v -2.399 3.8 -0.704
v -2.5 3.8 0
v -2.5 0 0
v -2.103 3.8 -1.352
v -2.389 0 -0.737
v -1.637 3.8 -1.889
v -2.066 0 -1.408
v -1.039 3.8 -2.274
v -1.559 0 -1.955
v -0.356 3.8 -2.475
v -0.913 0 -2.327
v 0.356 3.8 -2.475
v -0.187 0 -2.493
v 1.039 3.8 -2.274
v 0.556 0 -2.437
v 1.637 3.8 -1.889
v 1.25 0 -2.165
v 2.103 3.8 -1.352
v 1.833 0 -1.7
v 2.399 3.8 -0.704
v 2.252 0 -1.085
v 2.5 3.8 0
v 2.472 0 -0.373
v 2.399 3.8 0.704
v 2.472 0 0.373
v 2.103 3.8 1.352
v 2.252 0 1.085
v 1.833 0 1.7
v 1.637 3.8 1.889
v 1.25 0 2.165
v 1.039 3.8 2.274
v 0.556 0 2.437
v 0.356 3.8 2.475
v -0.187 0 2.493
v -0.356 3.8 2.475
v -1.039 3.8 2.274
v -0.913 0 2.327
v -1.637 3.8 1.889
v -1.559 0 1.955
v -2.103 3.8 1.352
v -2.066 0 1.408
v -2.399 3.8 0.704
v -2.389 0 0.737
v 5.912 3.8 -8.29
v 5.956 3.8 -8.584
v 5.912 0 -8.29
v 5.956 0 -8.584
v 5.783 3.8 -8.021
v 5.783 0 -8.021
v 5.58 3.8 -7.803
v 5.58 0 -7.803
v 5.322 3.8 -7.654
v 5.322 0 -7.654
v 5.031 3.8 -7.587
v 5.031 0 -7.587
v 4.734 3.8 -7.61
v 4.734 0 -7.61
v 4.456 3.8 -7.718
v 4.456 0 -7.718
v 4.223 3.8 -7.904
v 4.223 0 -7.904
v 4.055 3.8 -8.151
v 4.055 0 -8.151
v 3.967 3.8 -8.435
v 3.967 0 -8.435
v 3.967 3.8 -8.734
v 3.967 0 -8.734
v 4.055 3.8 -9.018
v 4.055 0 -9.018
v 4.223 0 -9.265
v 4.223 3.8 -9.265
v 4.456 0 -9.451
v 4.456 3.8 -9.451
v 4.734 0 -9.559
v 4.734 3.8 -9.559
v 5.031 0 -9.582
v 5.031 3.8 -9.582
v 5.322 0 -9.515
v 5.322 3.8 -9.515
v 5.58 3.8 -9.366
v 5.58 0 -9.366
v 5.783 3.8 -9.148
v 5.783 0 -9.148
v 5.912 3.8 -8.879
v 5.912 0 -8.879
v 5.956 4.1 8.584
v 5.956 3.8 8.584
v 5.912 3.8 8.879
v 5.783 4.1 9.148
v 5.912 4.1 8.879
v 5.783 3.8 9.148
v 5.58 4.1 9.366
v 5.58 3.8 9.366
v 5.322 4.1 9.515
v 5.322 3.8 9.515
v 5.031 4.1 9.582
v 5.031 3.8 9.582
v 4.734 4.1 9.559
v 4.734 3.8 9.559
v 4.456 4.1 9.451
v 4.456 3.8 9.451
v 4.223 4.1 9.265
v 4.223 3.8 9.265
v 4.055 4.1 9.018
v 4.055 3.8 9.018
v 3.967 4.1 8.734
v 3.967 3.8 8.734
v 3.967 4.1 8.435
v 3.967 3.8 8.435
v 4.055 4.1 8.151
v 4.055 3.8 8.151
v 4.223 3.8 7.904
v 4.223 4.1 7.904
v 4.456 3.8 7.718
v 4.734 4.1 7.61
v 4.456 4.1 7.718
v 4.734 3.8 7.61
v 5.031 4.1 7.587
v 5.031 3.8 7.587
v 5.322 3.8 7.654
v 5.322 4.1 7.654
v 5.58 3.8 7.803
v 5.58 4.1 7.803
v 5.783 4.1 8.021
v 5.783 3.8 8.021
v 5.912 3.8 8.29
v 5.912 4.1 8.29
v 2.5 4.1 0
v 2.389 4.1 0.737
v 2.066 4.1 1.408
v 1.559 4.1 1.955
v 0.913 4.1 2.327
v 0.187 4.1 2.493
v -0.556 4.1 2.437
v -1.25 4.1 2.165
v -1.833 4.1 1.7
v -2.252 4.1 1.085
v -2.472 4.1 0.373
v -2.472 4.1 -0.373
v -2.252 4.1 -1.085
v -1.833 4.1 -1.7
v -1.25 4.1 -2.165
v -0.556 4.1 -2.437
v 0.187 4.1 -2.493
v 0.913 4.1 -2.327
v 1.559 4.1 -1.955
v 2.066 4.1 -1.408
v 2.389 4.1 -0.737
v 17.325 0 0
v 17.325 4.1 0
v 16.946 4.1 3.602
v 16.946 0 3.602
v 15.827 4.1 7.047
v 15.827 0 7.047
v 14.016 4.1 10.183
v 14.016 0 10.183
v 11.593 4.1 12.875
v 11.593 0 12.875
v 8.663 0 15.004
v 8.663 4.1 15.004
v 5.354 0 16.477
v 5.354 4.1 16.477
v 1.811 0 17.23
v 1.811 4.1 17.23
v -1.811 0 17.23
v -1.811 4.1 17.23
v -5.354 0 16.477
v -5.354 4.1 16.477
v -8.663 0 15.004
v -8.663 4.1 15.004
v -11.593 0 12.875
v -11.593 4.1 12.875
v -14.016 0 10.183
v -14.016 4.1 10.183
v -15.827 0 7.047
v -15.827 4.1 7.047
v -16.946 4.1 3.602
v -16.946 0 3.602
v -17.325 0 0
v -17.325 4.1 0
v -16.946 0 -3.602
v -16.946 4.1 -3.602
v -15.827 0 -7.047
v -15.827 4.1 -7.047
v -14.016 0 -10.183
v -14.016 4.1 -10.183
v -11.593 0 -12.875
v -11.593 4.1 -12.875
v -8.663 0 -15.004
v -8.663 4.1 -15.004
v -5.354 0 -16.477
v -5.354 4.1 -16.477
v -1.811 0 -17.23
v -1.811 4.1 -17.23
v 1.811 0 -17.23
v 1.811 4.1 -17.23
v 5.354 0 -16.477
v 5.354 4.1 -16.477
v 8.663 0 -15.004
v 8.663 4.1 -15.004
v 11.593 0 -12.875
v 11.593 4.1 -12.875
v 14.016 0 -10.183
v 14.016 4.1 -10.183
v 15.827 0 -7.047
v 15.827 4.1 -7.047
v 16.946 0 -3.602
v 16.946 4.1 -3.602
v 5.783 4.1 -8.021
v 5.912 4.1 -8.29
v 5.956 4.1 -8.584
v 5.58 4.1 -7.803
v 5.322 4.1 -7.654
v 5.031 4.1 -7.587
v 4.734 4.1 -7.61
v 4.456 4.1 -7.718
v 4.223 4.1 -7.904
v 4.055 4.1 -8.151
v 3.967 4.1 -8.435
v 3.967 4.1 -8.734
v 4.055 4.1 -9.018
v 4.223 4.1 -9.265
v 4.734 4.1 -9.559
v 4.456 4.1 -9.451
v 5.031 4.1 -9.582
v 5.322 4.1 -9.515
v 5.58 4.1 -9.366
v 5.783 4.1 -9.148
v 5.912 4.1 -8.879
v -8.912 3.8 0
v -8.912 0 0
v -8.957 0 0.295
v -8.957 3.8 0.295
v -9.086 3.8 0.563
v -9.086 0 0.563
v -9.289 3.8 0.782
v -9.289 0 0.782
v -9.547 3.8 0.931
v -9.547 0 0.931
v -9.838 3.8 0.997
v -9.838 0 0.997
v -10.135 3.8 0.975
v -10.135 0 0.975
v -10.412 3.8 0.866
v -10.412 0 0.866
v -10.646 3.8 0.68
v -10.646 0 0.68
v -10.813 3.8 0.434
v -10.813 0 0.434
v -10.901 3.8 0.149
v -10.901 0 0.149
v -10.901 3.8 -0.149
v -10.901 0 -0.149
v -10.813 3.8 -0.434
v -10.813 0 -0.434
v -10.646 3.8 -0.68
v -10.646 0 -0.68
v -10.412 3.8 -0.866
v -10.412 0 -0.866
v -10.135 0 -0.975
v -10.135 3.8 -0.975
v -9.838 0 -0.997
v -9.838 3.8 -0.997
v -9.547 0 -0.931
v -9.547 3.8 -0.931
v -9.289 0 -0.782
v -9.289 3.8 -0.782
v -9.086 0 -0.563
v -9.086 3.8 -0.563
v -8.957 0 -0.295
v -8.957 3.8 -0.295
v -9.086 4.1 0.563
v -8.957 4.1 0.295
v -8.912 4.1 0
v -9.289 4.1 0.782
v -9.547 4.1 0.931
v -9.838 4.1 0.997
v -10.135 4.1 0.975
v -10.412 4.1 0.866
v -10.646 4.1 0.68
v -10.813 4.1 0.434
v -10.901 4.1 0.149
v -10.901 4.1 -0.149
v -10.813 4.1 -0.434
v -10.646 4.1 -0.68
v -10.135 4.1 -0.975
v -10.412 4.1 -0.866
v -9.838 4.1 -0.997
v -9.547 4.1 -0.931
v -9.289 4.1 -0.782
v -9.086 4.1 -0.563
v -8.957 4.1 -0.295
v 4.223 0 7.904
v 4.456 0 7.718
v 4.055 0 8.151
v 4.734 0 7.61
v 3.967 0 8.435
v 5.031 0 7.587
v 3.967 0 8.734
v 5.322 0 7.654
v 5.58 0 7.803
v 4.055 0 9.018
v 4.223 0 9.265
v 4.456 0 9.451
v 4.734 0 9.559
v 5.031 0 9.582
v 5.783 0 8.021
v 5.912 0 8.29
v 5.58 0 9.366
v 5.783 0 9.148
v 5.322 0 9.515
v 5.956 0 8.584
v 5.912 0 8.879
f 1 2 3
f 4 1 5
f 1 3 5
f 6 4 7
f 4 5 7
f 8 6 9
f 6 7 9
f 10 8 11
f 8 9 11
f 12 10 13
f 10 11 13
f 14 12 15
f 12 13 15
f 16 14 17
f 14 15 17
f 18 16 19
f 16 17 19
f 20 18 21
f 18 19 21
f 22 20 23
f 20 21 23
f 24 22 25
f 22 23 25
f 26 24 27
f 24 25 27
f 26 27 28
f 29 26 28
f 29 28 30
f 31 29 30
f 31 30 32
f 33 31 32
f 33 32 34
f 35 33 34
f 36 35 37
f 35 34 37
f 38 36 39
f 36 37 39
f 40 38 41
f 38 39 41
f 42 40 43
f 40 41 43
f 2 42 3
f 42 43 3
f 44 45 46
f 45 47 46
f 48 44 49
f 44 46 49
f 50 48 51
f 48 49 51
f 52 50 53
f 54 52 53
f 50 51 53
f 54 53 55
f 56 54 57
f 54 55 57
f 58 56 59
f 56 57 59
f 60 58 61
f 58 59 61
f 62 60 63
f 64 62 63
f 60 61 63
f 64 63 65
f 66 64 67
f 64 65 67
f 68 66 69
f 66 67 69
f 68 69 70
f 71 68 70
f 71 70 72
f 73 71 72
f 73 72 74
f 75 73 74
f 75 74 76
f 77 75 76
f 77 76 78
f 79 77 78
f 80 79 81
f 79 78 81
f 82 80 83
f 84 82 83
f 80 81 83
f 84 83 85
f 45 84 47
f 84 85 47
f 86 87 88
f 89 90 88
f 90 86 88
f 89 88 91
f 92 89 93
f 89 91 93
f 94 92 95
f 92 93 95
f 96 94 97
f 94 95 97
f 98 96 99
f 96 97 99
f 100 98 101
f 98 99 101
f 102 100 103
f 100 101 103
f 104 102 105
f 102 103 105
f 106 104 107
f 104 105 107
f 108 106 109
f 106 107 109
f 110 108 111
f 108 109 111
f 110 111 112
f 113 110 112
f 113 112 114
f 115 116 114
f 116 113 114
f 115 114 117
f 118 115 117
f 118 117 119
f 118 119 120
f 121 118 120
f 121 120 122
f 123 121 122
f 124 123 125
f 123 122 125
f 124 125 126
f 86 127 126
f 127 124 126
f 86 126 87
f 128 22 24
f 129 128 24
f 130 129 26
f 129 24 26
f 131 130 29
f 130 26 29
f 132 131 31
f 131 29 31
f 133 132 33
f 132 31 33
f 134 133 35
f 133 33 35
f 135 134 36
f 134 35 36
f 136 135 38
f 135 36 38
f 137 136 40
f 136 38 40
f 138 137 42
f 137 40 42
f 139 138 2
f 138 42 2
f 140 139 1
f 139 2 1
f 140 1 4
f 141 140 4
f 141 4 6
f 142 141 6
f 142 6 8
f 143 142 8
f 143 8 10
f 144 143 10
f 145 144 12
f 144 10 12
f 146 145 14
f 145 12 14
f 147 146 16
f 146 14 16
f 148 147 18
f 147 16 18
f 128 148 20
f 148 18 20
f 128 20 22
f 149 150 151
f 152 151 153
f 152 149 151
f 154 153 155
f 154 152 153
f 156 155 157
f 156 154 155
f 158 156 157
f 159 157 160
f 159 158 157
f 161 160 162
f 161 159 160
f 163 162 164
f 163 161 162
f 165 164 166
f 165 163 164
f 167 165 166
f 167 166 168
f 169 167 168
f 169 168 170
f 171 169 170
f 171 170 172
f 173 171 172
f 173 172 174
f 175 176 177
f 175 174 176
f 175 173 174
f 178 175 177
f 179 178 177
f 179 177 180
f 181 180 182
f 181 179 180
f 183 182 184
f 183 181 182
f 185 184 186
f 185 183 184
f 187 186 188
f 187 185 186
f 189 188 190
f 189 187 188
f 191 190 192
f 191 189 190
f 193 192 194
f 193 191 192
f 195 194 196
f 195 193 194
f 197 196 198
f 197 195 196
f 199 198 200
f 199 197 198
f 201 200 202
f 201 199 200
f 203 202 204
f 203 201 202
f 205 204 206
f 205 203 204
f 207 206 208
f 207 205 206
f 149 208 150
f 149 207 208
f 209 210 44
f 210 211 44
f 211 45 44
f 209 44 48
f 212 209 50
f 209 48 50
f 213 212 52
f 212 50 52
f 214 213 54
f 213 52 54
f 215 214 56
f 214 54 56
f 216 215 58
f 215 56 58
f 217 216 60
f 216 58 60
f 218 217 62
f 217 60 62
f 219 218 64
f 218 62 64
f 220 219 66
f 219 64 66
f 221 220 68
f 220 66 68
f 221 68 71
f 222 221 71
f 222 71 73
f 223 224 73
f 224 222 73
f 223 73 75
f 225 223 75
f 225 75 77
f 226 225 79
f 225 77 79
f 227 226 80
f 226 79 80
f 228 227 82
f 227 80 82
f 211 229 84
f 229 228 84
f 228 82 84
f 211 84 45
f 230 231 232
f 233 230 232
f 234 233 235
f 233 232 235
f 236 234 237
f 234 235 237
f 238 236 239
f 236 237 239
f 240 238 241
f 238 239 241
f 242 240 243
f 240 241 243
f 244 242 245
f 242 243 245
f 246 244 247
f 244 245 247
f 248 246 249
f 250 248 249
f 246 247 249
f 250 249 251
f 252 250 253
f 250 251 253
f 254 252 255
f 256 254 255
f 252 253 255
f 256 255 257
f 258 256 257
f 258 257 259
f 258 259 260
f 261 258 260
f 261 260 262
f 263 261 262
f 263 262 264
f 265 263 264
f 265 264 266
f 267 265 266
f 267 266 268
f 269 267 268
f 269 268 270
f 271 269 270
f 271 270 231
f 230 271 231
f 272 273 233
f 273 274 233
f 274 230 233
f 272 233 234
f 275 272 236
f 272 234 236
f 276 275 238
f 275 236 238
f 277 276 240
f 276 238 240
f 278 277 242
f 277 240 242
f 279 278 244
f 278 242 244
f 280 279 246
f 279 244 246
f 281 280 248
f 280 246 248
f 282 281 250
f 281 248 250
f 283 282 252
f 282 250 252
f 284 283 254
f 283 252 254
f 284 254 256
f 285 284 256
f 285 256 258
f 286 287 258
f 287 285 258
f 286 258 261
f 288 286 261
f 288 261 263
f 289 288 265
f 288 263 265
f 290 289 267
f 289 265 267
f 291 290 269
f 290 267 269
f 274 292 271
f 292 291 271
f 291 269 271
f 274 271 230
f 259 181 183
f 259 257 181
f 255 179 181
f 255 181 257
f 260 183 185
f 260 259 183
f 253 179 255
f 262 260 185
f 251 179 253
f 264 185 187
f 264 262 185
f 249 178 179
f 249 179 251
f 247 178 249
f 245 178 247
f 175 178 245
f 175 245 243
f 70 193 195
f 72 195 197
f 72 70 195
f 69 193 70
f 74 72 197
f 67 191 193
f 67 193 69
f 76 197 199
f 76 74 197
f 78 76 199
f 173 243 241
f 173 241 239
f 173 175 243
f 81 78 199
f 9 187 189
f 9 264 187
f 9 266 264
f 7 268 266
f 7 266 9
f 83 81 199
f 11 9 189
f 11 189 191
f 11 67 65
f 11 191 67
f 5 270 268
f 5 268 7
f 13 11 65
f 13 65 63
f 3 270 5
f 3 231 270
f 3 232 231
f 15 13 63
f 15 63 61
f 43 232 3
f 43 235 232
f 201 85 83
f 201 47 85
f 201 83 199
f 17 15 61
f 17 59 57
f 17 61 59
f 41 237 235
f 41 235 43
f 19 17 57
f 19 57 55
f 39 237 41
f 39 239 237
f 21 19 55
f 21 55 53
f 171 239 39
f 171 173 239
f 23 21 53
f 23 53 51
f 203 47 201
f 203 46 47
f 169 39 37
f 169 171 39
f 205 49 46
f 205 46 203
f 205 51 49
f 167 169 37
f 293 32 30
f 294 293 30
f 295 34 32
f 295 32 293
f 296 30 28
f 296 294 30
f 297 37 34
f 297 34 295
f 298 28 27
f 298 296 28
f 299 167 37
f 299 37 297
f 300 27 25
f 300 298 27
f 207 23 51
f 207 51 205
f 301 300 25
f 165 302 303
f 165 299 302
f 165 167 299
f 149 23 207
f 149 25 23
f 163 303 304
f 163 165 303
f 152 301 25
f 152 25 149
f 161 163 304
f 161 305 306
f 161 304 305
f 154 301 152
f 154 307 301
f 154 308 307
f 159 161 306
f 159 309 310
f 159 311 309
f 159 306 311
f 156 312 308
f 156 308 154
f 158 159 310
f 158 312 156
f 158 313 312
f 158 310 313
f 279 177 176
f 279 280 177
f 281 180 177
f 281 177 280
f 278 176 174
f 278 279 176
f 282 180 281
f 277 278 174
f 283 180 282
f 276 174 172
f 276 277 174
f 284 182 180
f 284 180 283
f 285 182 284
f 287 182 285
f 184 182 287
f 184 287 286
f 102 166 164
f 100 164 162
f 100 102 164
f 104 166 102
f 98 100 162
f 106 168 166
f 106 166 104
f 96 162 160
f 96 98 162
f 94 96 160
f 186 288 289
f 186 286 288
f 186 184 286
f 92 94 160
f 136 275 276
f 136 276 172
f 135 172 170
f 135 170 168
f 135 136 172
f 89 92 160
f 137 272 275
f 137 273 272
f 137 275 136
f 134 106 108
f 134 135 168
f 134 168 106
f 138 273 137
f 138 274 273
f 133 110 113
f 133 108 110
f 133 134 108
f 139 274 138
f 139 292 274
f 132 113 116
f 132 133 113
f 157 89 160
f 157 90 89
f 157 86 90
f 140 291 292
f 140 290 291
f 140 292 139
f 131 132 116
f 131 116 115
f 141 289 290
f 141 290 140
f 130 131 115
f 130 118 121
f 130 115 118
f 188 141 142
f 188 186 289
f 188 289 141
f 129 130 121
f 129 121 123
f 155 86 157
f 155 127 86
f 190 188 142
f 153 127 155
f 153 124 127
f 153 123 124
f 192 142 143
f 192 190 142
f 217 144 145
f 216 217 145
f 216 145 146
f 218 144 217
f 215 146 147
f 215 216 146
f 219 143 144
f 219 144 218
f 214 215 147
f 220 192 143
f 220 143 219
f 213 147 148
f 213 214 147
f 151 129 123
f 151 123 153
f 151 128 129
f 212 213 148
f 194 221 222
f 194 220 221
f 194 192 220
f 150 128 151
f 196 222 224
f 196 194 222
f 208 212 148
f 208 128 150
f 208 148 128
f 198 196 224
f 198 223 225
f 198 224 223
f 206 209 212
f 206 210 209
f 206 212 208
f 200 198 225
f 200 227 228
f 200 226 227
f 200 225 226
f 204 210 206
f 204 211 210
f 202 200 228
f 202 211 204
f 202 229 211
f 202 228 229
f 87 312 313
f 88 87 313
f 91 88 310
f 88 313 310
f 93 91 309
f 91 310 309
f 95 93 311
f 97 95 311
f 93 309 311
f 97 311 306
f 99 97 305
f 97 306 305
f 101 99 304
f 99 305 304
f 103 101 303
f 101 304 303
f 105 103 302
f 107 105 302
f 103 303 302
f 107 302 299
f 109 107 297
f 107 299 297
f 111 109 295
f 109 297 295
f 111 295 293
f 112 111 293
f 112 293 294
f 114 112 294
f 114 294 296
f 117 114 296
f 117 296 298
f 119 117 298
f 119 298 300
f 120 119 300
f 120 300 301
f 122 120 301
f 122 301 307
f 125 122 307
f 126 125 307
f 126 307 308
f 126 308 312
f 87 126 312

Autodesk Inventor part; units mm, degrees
ref_plane "YZ Plane" through (0, 0, 0) normal (1, 0, 0) x (0, 1, 0)
ref_plane "XZ Plane" through (0, 0, 0) normal (0, 1, 0) x (-1, 0, 0)
ref_plane "XY Plane" through (0, 0, 0) normal (0, 0, 1) x (1, 0, 0)
sketch "Sketch1" plane through (0, 0, 0) normal (0, 1, 0) x (-1, 0, 0)
  circle A0 centre (0, 0) radius 16.575
  circle A1 centre (0, 0) radius 2.5
  dimension "d0" = 33.15
  dimension "d1" = 5
extrude "Extrusion1" add sketch "Sketch1" along normal blind 3.8
sketch "Sketch2" plane through (0, 3.8, 0) normal (0, 1, 0) x (1, 0, 0)
  circle A0 centre (0, 0) radius 2.5 projected
  circle A1 centre (0, 0) radius 16.575 projected
  line L0 (-2.5, 0) -> (-16.575, 0)
  circle A2 centre (-9.5375, 0) radius 1.5
  line L1 (0, 0) -> (16.575, 0) construction
  line L2 (0, 0) -> (16.575, 0) construction
  circle A3 centre (4.7688, 8.2597) radius 1.5
  circle A4 centre (4.7688, -8.2597) radius 1.5
  dimension "d4" = 3
  dimension "d7" = 3
  dimension "d8" = 3
extrude "Extrusion2" cut sketch "Sketch2" against normal blind 3.8 contours A2 L0 | L0 A2 | A3 | A4
sketch "Sketch3" plane through (0, 0, 0) normal (0, -1, 0) x (1, 0, 0)
  circle A0 centre (0, 0) radius 16.575 projected
  circle A1 centre (0, 0) radius 17.325
  dimension "d11" = 34.65
extrude "Extrusion3" add sketch "Sketch3" against normal blind 3.8
sketch "Sketch4" plane through (0, 0, 0) normal (0, -1, 0) x (1, 0, 0)
  circle A0 centre (4.7688, -8.2597) radius 1.5 projected
  circle A1 centre (-9.5375, 0) radius 1.5 projected
  circle A2 centre (4.7688, 8.2597) radius 1.5 projected
extrude "Extrusion4" add sketch "Sketch4" against normal blind 3.8
sketch "Sketch5" plane through (0, 0, 0) normal (0, -1, 0) x (1, 0, 0)
  circle A0 centre (0, 0) radius 17.325 projected
  circle A1 centre (0, 0) radius 2.5 projected
  line L0 (-2.5, 0) -> (-17.325, 0)
  circle A2 centre (-9.9125, 0) radius 1
  line L1 (0, 0) -> (17.325, 0) construction
  line L2 (0, 0) -> (17.325, 0) construction
  circle A3 centre (4.9563, -8.5845) radius 1
  circle A4 centre (4.9563, 8.5845) radius 1
  dimension "d16" = 2
  dimension "d19" = 2
  dimension "d20" = 2
extrude "Extrusion5" cut sketch "Sketch5" against normal blind 3.8 contours A2 L0 | L0 A2 | A3 | A4
sketch "Sketch7" plane through (0, 3.8, 0) normal (0, 1, 0) x (1, 0, 0)
  circle A0 centre (4.9563, 8.5845) radius 1 projected
  circle A1 centre (-9.9125, 0) radius 1 projected
  circle A2 centre (4.9563, -8.5845) radius 1 projected
  circle A3 centre (0, 0) radius 17.325 projected
  circle A4 centre (0, 0) radius 2.5 projected
extrude "Extrusion6" add sketch "Sketch7" along normal blind 0.3
properties part number "kolecko_rameno(2)"
